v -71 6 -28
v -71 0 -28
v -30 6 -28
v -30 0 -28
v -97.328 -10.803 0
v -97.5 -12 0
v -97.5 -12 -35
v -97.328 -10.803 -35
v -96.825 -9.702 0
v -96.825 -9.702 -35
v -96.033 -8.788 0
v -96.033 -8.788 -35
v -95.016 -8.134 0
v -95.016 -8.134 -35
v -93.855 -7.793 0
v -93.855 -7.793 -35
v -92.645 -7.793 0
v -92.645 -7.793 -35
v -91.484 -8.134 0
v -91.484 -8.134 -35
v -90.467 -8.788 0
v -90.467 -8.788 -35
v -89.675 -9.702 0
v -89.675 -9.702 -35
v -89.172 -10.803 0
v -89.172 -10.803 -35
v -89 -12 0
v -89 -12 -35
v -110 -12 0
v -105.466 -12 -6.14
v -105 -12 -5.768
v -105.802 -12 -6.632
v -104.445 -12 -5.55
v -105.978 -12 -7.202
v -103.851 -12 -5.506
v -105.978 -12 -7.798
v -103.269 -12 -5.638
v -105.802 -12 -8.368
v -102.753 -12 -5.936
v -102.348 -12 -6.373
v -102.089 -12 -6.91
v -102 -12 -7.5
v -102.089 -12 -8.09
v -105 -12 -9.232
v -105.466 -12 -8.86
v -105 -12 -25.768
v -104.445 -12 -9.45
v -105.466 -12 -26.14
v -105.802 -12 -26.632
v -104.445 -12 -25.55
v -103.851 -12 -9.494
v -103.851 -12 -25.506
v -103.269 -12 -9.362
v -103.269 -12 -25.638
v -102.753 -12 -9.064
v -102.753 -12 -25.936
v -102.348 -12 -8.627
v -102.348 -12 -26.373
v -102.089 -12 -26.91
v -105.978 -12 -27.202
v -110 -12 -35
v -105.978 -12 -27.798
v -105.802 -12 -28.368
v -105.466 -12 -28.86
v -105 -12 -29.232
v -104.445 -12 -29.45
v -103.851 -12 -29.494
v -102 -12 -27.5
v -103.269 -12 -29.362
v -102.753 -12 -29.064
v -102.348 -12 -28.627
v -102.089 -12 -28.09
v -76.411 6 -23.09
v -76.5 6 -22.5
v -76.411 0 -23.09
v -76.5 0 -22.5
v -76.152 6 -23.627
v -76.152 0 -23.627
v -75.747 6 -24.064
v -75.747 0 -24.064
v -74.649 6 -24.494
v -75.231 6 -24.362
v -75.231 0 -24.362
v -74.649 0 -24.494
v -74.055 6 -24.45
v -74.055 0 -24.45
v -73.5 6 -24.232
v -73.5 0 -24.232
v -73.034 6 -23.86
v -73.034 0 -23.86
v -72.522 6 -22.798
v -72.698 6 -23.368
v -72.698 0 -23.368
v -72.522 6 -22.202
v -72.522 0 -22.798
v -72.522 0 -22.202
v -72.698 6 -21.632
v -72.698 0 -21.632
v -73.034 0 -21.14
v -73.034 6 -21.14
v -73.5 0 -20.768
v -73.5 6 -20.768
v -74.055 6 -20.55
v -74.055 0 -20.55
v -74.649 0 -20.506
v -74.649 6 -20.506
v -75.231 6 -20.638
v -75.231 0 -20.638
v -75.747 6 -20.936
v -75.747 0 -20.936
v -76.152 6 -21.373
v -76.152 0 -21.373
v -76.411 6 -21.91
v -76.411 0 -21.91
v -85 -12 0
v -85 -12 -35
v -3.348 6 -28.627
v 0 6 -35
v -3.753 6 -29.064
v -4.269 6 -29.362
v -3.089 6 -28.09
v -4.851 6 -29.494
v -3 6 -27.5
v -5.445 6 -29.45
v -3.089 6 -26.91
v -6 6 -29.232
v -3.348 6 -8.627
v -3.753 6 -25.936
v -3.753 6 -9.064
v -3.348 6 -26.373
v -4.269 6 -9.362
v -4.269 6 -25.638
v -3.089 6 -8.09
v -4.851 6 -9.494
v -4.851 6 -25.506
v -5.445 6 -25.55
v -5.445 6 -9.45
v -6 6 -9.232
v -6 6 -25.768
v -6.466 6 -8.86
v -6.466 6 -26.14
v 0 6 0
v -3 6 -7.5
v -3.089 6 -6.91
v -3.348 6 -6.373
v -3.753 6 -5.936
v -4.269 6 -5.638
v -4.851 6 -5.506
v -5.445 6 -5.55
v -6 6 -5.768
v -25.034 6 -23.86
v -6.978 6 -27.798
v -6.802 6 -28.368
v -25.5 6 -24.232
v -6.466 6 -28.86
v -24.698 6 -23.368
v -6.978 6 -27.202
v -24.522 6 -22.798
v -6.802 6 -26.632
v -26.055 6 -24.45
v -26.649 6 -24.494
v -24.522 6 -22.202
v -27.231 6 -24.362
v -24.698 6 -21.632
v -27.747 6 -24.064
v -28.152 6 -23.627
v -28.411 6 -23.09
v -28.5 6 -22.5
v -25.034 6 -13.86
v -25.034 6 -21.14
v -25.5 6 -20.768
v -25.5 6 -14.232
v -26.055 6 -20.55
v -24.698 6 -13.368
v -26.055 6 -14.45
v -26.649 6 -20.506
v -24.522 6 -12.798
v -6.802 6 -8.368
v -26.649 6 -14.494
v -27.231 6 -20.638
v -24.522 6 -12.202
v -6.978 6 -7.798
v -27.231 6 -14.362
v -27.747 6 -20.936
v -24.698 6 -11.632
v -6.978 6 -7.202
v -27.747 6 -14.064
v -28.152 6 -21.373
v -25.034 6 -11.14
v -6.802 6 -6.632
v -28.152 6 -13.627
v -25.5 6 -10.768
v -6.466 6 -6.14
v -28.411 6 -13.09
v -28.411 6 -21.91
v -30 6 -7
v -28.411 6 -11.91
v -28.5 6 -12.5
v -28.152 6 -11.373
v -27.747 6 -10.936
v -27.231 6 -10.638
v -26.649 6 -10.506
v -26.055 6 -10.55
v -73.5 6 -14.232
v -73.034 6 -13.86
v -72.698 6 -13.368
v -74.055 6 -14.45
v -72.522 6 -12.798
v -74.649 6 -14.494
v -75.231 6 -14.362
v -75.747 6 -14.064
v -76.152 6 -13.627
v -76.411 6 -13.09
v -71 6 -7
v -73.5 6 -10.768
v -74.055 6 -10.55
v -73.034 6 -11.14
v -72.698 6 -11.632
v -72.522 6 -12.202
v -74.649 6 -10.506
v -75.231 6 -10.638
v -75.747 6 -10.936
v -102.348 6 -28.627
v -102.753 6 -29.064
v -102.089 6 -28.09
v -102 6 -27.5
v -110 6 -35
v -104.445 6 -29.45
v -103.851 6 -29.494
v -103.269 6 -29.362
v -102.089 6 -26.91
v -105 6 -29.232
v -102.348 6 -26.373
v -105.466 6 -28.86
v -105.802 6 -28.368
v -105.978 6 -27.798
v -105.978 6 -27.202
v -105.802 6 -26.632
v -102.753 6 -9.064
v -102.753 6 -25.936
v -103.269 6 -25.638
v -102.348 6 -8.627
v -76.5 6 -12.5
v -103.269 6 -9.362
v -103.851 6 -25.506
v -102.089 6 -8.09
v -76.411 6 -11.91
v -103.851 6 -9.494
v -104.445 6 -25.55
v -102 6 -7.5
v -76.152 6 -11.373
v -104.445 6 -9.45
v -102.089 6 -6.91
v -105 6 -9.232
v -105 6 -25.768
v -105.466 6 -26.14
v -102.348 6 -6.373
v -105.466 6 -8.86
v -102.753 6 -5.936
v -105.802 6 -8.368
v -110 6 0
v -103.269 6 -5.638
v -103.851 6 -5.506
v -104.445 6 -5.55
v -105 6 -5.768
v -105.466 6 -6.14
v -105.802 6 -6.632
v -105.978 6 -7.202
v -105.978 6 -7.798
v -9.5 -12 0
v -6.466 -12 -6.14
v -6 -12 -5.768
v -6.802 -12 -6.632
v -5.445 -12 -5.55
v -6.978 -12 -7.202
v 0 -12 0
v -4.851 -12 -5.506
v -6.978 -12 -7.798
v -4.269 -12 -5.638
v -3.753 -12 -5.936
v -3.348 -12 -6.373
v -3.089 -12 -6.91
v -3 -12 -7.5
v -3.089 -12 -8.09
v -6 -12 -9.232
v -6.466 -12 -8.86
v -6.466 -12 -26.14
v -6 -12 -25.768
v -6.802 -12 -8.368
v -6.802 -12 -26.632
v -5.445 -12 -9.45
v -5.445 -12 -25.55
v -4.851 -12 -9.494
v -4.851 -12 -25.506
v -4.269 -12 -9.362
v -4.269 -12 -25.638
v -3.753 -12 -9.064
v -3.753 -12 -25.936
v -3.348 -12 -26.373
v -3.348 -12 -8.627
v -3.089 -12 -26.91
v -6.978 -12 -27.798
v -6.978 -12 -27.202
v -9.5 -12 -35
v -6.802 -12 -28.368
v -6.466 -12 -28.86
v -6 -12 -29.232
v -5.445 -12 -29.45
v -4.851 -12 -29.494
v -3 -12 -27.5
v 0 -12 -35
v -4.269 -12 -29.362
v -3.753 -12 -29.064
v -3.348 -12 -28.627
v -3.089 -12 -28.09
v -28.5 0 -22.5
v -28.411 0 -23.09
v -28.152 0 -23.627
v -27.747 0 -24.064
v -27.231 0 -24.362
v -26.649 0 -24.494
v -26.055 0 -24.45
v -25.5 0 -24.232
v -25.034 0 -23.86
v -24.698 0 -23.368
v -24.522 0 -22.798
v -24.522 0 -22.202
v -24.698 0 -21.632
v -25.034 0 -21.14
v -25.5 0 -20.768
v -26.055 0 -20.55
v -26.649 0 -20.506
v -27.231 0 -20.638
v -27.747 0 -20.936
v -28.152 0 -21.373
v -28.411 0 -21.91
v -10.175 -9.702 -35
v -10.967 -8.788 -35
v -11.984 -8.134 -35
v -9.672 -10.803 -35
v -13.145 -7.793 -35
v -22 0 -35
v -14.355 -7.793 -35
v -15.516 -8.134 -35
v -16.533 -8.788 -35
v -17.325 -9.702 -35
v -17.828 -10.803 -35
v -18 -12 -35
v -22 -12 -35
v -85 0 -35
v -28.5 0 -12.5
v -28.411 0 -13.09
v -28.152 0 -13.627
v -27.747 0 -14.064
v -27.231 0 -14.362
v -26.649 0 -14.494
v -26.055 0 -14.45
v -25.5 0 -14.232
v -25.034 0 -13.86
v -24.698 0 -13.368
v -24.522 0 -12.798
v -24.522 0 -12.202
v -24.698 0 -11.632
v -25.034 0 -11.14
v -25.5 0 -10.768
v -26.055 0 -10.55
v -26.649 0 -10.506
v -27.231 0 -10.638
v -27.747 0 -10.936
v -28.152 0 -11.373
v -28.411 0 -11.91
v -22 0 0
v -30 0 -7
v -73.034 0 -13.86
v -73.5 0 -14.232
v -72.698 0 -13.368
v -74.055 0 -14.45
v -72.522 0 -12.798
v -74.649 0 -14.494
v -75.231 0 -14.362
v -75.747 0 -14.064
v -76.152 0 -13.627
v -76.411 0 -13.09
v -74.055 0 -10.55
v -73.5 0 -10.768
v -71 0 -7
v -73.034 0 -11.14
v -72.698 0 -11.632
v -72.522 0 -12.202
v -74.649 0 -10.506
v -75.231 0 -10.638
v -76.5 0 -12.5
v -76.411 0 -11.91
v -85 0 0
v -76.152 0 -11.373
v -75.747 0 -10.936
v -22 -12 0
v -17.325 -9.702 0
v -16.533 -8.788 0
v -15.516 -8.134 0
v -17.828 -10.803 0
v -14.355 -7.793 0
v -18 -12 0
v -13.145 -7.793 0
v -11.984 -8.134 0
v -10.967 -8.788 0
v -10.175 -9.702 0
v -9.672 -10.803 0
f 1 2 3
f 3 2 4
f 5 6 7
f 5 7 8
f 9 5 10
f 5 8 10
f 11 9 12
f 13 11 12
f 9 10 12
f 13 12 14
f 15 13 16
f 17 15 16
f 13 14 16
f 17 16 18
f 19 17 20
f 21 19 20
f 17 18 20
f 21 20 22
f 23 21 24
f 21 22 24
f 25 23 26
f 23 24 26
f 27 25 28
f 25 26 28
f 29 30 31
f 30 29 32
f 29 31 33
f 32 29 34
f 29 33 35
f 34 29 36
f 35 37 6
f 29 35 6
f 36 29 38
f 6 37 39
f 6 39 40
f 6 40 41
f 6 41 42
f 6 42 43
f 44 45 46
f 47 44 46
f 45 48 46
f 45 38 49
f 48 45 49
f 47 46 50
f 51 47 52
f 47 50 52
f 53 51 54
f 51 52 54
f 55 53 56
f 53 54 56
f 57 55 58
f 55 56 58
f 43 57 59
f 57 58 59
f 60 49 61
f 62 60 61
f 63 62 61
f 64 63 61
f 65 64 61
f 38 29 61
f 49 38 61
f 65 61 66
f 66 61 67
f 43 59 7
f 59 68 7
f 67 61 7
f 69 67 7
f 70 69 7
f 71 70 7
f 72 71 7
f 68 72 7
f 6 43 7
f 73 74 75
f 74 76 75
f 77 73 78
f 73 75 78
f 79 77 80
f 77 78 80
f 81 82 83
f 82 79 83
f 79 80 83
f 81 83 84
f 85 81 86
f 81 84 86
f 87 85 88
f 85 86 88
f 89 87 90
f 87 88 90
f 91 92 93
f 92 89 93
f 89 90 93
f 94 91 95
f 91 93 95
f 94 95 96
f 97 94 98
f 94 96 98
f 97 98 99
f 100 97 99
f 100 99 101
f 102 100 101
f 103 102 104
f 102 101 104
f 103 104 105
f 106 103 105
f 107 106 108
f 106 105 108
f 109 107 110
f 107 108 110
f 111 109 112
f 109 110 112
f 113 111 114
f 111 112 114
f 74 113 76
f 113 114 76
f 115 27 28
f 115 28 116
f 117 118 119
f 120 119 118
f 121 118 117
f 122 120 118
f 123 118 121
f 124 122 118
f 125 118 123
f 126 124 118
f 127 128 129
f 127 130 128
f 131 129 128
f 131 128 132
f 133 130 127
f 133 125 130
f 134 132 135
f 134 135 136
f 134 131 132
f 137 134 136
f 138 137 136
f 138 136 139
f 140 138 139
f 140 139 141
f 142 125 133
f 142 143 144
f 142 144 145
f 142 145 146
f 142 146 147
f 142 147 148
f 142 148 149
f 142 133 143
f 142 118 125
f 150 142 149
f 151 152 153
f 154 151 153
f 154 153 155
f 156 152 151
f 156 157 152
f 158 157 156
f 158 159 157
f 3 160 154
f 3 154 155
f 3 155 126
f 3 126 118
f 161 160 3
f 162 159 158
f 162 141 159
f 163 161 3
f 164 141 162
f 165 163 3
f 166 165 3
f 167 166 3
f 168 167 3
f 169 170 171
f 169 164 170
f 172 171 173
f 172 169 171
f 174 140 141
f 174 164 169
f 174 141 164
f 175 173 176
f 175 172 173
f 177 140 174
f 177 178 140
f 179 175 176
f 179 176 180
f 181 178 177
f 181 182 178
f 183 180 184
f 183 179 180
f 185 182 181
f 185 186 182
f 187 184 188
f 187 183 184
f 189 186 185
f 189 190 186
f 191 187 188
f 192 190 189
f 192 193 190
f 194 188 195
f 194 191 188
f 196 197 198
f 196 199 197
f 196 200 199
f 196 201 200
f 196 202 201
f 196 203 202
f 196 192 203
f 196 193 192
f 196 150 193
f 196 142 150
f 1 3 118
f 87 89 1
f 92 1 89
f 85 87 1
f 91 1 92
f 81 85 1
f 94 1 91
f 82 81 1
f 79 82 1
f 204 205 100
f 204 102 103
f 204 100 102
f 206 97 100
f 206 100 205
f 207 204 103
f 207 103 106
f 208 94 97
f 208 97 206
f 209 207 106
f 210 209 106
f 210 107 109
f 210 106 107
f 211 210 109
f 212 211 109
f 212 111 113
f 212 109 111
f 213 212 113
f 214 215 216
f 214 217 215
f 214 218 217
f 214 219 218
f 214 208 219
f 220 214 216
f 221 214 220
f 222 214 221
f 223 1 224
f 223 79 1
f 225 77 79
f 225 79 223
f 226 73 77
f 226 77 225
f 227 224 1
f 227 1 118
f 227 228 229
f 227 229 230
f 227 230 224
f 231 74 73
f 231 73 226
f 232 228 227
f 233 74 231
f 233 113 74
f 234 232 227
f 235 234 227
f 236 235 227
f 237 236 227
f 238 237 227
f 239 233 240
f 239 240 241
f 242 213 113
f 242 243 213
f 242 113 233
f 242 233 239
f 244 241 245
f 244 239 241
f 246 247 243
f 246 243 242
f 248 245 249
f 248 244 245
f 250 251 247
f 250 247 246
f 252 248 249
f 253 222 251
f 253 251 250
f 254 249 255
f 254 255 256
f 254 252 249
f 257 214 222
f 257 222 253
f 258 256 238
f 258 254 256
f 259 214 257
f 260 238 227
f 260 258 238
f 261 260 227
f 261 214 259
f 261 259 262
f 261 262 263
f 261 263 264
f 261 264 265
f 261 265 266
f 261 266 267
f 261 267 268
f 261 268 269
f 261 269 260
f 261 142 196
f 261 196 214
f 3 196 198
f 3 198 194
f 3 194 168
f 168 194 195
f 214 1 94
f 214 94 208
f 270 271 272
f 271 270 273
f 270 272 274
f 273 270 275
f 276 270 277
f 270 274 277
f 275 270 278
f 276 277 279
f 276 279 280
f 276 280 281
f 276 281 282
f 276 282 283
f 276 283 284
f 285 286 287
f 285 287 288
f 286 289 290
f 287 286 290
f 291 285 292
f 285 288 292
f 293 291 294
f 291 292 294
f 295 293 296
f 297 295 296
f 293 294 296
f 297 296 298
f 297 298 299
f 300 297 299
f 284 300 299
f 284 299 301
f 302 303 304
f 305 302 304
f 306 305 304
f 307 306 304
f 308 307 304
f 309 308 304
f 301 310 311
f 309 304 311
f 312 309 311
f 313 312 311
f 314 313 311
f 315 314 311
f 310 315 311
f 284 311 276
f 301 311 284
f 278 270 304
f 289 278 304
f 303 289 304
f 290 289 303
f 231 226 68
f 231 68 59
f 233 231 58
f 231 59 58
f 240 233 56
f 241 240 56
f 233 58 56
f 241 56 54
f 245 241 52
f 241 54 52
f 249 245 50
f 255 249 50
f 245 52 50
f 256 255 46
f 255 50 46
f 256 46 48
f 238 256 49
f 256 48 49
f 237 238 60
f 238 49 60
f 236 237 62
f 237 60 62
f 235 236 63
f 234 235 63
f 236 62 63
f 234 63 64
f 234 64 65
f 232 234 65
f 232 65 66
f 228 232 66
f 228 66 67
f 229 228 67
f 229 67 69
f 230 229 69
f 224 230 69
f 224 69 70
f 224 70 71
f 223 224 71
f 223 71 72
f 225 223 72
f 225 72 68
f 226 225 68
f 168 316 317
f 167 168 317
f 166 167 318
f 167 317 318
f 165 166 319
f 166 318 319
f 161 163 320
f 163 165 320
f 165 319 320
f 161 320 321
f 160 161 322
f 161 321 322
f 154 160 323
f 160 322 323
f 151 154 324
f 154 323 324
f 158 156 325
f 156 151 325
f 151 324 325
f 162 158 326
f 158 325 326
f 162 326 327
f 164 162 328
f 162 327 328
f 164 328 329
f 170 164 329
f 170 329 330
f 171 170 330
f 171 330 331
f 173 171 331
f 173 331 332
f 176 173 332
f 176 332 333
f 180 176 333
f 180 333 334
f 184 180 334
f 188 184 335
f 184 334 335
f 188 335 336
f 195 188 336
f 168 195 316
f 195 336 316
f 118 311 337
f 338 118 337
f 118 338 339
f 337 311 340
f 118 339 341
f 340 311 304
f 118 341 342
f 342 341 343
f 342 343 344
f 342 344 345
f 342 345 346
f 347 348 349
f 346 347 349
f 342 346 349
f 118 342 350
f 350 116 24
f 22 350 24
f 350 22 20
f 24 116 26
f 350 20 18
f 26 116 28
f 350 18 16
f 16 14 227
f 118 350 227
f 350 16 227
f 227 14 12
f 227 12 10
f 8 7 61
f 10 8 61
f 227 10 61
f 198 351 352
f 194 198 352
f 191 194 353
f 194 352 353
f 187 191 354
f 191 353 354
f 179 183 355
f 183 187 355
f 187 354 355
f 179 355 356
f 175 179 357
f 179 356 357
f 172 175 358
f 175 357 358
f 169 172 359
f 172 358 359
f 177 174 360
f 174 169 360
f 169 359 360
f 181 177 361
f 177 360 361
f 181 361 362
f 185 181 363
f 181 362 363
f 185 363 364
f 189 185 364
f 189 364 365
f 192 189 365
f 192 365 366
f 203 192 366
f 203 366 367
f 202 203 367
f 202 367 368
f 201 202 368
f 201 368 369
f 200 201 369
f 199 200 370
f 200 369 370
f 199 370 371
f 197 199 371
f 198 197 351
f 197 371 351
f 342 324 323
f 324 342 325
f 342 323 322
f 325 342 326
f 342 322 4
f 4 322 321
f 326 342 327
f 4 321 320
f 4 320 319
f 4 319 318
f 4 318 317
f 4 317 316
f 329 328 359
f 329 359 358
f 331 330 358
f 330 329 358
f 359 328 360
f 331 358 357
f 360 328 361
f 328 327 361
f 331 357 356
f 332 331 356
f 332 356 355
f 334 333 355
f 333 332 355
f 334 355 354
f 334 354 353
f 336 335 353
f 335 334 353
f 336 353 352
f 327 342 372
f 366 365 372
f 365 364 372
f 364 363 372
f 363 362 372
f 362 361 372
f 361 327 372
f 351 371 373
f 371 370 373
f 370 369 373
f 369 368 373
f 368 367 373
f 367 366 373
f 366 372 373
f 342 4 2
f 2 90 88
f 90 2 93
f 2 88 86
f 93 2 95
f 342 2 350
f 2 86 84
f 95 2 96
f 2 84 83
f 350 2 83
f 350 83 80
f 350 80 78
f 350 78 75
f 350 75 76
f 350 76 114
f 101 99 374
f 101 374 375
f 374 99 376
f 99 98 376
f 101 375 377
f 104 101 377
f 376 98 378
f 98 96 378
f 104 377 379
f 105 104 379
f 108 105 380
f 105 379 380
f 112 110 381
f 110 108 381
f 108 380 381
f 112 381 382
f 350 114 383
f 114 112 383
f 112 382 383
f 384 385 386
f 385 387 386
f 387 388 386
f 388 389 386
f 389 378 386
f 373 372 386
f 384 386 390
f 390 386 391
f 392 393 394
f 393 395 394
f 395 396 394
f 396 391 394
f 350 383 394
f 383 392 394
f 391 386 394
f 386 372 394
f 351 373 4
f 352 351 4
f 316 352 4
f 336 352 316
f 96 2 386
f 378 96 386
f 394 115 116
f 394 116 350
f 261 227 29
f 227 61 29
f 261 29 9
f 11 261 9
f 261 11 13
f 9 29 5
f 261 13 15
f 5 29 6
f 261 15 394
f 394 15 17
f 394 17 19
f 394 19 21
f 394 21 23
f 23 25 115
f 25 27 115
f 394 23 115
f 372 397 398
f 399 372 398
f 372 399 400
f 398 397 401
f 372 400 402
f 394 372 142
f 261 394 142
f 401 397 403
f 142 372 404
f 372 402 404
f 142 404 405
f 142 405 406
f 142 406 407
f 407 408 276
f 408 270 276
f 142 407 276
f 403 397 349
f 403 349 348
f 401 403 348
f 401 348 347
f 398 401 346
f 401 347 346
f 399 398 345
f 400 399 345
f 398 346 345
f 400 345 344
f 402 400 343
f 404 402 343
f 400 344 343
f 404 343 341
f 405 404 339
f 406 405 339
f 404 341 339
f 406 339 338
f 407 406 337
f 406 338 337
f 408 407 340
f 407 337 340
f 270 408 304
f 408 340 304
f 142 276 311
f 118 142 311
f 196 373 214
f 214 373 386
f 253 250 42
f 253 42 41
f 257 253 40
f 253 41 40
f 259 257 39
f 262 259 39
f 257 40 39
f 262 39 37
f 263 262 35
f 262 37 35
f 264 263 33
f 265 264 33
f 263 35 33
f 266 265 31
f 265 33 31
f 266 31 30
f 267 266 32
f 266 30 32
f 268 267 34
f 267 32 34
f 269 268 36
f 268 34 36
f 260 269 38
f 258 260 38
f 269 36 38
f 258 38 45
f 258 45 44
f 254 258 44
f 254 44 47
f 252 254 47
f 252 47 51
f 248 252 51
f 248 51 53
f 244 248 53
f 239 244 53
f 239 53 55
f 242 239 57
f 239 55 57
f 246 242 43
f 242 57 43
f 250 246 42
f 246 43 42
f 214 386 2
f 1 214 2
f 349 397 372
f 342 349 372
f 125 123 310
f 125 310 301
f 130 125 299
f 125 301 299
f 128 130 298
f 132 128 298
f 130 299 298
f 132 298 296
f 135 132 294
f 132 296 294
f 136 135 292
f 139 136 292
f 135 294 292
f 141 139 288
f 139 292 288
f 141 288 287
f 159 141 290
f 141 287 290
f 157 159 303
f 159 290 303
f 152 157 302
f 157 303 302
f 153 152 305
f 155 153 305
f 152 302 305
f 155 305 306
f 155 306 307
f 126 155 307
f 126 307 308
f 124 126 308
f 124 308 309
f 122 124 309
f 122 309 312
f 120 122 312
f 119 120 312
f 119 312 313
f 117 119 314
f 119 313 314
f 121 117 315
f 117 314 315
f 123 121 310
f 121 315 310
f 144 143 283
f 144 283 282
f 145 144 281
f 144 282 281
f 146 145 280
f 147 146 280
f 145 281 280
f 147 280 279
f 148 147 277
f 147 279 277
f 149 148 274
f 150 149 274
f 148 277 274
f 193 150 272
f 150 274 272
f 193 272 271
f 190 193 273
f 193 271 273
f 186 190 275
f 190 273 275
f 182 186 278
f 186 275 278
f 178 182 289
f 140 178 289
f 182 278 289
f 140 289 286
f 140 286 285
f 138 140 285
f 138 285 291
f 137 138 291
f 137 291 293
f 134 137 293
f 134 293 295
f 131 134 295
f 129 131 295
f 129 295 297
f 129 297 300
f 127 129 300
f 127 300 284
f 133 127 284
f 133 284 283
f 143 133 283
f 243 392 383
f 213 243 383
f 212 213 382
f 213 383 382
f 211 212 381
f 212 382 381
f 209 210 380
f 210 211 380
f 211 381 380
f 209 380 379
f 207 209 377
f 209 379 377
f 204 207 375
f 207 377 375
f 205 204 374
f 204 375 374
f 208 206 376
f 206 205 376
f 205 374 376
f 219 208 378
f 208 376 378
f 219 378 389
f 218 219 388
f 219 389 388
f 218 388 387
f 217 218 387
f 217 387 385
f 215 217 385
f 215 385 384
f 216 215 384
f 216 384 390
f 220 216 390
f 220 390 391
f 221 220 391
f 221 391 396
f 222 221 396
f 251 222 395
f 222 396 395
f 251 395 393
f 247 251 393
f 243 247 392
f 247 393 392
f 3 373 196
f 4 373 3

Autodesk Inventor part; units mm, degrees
ref_plane "YZ Plane" through (0, 0, 0) normal (1, 0, 0) x (0, 1, 0)
ref_plane "XZ Plane" through (0, 0, 0) normal (0, 1, 0) x (-1, 0, 0)
ref_plane "XY Plane" through (0, 0, 0) normal (0, 0, 1) x (1, 0, 0)
sketch "Sketch1" plane through (0, 0, 0) normal (0, 1, 0) x (-1, 0, 0)
  line L0 (0, 0) -> (0, -35)
  line L1 (0, -35) -> (110, -35)
  line L2 (110, -35) -> (110, 0)
  line L3 (110, 0) -> (0, 0)
  line L4 (0, -35) -> (30, -35)
  line L5 (30, -17.5) -> (30, -28)
  line L6 (30, -28) -> (30, -7)
  line L7 (30, -7) -> (71, -7)
  line L8 (71, -7) -> (71, -28)
  line L9 (71, -28) -> (30, -28)
  circle A0 centre (74.5, -12.5) radius 2
  circle A1 centre (74.5, -22.5) radius 2
  circle A2 centre (26.5, -22.5) radius 2
  circle A3 centre (26.5, -12.5) radius 2
  dimension "d0" = 35
  dimension "d1" = 110
  dimension "d4" = 21
  dimension "d5" = 41
  dimension "d6" = 21
  dimension "d10" = 4
  dimension "d11" = 4
  dimension "d15" = 4
  dimension "d16" = 4
extrude "Extrusion1" add sketch "Sketch1" along normal blind 6
sketch "Sketch2" plane through (0, 0, -35) normal (0, 0, -1) x (-1, 0, 0)
  line L0 (0, 0) -> (0, 6) projected
  line L1 (0, 0) -> (0, -12)
  line L2 (22, -12) -> (22, 0)
  line L3 (0, 0) -> (110, 0) projected
  line L4 (22, -12) -> (18, -12)
  arc A0 (18, -12) -> (9.5, -12) centre (13.75, -12) ccw
  line L5 (9.5, -12) -> (0, -12)
  line L6 (110, 0) -> (110, -12)
  line L7 (85, -12) -> (85, 0)
  arc A1 (97.5, -12) -> (89, -12) centre (93.25, -12) ccw
  line L8 (89, -12) -> (85, -12)
  line L9 (110, -12) -> (97.5, -12)
  dimension "d19" = 12
  dimension "d20" = 22
  dimension "d21" = 4
  dimension "d23" = 8.5
  dimension "d24" = 12
  dimension "d25" = 25
  dimension "d26" = 8.5
  dimension "d27" = 8.25
extrude "Extrusion2" add sketch "Sketch2" against normal blind 35
sketch "Sketch3" plane through (-110, -12, -35) normal (0, -1, 0) x (1, 0, 0)
  line L0 (0, 0) -> (0, 35) projected
  circle A0 centre (6, 7.5) radius 2
  circle A1 centre (6, 27.5) radius 2
  line L1 (110, 35) -> (110, 0) projected
  circle A2 centre (105, 27.5) radius 2
  circle A3 centre (105, 7.5) radius 2
  dimension "d33" = 4
  dimension "d34" = 4
  dimension "d38" = 4
  dimension "d39" = 4
extrude "Extrusion3" cut sketch "Sketch3" against normal blind 18
properties part number "g_servo mount 1"
